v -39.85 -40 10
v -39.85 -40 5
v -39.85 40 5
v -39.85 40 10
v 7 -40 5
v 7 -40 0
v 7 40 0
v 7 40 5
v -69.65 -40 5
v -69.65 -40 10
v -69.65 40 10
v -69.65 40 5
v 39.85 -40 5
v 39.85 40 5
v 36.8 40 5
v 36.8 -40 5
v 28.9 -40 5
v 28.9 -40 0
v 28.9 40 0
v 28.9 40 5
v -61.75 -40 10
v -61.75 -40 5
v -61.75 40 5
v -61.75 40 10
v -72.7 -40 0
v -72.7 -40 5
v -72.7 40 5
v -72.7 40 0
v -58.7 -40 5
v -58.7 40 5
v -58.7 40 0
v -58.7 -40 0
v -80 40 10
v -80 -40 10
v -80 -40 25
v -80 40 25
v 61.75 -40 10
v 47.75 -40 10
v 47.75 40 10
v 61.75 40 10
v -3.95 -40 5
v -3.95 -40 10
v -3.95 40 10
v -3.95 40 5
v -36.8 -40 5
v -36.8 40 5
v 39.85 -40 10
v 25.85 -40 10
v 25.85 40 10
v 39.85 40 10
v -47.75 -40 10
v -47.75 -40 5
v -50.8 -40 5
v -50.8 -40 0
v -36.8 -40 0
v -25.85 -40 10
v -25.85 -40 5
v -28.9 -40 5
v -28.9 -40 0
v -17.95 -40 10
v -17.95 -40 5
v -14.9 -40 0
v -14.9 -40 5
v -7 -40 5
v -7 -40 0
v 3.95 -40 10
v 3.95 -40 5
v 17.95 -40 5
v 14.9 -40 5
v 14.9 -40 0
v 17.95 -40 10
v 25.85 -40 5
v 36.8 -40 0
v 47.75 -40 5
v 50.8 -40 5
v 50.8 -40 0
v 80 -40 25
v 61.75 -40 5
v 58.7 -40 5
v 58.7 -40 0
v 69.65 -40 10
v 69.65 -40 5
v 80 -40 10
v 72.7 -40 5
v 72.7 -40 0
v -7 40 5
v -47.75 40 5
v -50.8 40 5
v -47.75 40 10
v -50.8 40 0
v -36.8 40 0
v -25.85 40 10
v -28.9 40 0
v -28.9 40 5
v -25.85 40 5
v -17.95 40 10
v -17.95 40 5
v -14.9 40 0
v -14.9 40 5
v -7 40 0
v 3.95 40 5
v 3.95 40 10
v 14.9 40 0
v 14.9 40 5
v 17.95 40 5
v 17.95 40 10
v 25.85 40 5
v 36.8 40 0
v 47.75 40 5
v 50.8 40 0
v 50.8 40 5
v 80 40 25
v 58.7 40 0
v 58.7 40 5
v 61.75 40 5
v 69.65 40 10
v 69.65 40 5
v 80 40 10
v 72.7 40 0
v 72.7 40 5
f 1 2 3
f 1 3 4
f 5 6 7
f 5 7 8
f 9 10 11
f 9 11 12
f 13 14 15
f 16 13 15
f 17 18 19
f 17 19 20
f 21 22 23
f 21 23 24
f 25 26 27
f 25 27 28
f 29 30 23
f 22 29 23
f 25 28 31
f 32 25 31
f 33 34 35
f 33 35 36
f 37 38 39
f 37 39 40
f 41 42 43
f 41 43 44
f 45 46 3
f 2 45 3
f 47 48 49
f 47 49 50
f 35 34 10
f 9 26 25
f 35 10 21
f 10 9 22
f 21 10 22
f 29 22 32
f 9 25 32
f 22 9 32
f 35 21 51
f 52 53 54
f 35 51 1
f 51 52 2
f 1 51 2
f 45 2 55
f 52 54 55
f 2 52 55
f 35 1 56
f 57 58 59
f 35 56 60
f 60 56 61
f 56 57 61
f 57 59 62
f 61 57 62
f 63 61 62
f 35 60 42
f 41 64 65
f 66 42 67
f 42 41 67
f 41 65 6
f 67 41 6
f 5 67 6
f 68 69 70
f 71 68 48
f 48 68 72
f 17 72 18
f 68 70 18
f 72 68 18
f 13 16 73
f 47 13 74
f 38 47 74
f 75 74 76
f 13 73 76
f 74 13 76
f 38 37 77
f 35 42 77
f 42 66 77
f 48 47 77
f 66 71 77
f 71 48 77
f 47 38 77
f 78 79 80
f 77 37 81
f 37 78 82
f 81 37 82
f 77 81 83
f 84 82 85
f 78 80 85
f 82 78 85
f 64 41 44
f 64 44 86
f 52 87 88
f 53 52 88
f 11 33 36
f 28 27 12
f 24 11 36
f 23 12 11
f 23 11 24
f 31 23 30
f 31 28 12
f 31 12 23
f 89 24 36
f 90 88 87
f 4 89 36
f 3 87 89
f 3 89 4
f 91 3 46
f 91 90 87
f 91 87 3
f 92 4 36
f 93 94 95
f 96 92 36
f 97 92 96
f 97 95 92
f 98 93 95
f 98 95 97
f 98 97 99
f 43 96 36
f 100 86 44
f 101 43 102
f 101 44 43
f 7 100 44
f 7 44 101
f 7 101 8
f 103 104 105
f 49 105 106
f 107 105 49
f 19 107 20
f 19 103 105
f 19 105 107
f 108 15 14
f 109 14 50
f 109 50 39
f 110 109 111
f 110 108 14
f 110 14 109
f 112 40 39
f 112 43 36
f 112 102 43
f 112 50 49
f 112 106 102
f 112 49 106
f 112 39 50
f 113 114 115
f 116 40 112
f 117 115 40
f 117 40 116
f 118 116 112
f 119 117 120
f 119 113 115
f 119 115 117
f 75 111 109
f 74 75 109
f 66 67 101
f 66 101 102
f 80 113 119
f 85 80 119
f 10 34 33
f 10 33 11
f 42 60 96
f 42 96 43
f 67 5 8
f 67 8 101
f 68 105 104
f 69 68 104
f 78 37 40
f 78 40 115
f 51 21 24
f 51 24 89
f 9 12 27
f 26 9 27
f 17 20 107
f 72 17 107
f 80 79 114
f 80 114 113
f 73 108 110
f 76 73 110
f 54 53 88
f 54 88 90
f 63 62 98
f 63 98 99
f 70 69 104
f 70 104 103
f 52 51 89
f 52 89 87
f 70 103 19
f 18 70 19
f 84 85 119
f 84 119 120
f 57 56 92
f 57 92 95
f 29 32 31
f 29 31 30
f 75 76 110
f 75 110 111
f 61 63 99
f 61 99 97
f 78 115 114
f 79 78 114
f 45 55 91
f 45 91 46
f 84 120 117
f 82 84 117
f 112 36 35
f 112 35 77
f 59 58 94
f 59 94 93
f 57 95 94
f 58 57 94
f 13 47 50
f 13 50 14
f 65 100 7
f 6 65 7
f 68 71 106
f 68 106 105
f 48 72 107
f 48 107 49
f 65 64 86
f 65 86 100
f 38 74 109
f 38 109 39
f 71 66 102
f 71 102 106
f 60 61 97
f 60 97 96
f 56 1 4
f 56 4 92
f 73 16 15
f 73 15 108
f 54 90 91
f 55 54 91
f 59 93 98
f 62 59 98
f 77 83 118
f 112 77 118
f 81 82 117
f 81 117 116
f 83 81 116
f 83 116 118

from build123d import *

# Parameters (mm, degrees)
SKETCH1_W           = 160
SKETCH1_H           = 80
BOSS_EXTRUDE1_DEPTH = 25
CUT_EXTRUDE1_START  = -80
CUT_EXTRUDE1_DEPTH  = 80


# Read off the part's stored shape, not the designer's step: Cut-Extrude1
with BuildPart() as part:
    # Sketch1 → Boss-Extrude1 (new body)
    with BuildSketch(Plane.XY):
        Rectangle(SKETCH1_W, SKETCH1_H)
    extrude(amount=BOSS_EXTRUDE1_DEPTH)

    # Cut-Extrude1 outline → Cut-Extrude1 (cut)
    with BuildSketch(Plane(origin=(0, 40, 0), x_dir=(1, 0, 0), z_dir=(0, 1, 0)).offset(CUT_EXTRUDE1_START)):
        Polygon((-80, 0), (-80, -10), (-69.65, -10), (-69.65, -5), (-72.7, -5), (-72.7, 0), align=None)
        Polygon((80, 0), (72.7, 0), (72.7, -5), (69.65, -5), (69.65, -10), (80, -10), align=None)
        Polygon((58.7, 0), (50.8, 0), (50.8, -5), (47.75, -5), (47.75, -10), (61.75, -10), (61.75, -5), (58.7, -5), align=None)
        Polygon((36.8, 0), (28.9, 0), (28.9, -5), (25.85, -5), (25.85, -10), (39.85, -10), (39.85, -5), (36.8, -5), align=None)
        Polygon((14.9, 0), (7, 0), (7, -5), (3.95, -5), (3.95, -10), (17.95, -10), (17.95, -5), (14.9, -5), align=None)
        Polygon((-7, 0), (-14.9, 0), (-14.9, -5), (-17.95, -5), (-17.95, -10), (-3.95, -10), (-3.95, -5), (-7, -5), align=None)
        Polygon((-28.9, 0), (-36.8, 0), (-36.8, -5), (-39.85, -5), (-39.85, -10), (-25.85, -10), (-25.85, -5), (-28.9, -5), align=None)
        Polygon((-50.8, 0), (-58.7, 0), (-58.7, -5), (-61.75, -5), (-61.75, -10), (-47.75, -10), (-47.75, -5), (-50.8, -5), align=None)
    extrude(amount=CUT_EXTRUDE1_DEPTH, mode=Mode.SUBTRACT)


solid = part.part
